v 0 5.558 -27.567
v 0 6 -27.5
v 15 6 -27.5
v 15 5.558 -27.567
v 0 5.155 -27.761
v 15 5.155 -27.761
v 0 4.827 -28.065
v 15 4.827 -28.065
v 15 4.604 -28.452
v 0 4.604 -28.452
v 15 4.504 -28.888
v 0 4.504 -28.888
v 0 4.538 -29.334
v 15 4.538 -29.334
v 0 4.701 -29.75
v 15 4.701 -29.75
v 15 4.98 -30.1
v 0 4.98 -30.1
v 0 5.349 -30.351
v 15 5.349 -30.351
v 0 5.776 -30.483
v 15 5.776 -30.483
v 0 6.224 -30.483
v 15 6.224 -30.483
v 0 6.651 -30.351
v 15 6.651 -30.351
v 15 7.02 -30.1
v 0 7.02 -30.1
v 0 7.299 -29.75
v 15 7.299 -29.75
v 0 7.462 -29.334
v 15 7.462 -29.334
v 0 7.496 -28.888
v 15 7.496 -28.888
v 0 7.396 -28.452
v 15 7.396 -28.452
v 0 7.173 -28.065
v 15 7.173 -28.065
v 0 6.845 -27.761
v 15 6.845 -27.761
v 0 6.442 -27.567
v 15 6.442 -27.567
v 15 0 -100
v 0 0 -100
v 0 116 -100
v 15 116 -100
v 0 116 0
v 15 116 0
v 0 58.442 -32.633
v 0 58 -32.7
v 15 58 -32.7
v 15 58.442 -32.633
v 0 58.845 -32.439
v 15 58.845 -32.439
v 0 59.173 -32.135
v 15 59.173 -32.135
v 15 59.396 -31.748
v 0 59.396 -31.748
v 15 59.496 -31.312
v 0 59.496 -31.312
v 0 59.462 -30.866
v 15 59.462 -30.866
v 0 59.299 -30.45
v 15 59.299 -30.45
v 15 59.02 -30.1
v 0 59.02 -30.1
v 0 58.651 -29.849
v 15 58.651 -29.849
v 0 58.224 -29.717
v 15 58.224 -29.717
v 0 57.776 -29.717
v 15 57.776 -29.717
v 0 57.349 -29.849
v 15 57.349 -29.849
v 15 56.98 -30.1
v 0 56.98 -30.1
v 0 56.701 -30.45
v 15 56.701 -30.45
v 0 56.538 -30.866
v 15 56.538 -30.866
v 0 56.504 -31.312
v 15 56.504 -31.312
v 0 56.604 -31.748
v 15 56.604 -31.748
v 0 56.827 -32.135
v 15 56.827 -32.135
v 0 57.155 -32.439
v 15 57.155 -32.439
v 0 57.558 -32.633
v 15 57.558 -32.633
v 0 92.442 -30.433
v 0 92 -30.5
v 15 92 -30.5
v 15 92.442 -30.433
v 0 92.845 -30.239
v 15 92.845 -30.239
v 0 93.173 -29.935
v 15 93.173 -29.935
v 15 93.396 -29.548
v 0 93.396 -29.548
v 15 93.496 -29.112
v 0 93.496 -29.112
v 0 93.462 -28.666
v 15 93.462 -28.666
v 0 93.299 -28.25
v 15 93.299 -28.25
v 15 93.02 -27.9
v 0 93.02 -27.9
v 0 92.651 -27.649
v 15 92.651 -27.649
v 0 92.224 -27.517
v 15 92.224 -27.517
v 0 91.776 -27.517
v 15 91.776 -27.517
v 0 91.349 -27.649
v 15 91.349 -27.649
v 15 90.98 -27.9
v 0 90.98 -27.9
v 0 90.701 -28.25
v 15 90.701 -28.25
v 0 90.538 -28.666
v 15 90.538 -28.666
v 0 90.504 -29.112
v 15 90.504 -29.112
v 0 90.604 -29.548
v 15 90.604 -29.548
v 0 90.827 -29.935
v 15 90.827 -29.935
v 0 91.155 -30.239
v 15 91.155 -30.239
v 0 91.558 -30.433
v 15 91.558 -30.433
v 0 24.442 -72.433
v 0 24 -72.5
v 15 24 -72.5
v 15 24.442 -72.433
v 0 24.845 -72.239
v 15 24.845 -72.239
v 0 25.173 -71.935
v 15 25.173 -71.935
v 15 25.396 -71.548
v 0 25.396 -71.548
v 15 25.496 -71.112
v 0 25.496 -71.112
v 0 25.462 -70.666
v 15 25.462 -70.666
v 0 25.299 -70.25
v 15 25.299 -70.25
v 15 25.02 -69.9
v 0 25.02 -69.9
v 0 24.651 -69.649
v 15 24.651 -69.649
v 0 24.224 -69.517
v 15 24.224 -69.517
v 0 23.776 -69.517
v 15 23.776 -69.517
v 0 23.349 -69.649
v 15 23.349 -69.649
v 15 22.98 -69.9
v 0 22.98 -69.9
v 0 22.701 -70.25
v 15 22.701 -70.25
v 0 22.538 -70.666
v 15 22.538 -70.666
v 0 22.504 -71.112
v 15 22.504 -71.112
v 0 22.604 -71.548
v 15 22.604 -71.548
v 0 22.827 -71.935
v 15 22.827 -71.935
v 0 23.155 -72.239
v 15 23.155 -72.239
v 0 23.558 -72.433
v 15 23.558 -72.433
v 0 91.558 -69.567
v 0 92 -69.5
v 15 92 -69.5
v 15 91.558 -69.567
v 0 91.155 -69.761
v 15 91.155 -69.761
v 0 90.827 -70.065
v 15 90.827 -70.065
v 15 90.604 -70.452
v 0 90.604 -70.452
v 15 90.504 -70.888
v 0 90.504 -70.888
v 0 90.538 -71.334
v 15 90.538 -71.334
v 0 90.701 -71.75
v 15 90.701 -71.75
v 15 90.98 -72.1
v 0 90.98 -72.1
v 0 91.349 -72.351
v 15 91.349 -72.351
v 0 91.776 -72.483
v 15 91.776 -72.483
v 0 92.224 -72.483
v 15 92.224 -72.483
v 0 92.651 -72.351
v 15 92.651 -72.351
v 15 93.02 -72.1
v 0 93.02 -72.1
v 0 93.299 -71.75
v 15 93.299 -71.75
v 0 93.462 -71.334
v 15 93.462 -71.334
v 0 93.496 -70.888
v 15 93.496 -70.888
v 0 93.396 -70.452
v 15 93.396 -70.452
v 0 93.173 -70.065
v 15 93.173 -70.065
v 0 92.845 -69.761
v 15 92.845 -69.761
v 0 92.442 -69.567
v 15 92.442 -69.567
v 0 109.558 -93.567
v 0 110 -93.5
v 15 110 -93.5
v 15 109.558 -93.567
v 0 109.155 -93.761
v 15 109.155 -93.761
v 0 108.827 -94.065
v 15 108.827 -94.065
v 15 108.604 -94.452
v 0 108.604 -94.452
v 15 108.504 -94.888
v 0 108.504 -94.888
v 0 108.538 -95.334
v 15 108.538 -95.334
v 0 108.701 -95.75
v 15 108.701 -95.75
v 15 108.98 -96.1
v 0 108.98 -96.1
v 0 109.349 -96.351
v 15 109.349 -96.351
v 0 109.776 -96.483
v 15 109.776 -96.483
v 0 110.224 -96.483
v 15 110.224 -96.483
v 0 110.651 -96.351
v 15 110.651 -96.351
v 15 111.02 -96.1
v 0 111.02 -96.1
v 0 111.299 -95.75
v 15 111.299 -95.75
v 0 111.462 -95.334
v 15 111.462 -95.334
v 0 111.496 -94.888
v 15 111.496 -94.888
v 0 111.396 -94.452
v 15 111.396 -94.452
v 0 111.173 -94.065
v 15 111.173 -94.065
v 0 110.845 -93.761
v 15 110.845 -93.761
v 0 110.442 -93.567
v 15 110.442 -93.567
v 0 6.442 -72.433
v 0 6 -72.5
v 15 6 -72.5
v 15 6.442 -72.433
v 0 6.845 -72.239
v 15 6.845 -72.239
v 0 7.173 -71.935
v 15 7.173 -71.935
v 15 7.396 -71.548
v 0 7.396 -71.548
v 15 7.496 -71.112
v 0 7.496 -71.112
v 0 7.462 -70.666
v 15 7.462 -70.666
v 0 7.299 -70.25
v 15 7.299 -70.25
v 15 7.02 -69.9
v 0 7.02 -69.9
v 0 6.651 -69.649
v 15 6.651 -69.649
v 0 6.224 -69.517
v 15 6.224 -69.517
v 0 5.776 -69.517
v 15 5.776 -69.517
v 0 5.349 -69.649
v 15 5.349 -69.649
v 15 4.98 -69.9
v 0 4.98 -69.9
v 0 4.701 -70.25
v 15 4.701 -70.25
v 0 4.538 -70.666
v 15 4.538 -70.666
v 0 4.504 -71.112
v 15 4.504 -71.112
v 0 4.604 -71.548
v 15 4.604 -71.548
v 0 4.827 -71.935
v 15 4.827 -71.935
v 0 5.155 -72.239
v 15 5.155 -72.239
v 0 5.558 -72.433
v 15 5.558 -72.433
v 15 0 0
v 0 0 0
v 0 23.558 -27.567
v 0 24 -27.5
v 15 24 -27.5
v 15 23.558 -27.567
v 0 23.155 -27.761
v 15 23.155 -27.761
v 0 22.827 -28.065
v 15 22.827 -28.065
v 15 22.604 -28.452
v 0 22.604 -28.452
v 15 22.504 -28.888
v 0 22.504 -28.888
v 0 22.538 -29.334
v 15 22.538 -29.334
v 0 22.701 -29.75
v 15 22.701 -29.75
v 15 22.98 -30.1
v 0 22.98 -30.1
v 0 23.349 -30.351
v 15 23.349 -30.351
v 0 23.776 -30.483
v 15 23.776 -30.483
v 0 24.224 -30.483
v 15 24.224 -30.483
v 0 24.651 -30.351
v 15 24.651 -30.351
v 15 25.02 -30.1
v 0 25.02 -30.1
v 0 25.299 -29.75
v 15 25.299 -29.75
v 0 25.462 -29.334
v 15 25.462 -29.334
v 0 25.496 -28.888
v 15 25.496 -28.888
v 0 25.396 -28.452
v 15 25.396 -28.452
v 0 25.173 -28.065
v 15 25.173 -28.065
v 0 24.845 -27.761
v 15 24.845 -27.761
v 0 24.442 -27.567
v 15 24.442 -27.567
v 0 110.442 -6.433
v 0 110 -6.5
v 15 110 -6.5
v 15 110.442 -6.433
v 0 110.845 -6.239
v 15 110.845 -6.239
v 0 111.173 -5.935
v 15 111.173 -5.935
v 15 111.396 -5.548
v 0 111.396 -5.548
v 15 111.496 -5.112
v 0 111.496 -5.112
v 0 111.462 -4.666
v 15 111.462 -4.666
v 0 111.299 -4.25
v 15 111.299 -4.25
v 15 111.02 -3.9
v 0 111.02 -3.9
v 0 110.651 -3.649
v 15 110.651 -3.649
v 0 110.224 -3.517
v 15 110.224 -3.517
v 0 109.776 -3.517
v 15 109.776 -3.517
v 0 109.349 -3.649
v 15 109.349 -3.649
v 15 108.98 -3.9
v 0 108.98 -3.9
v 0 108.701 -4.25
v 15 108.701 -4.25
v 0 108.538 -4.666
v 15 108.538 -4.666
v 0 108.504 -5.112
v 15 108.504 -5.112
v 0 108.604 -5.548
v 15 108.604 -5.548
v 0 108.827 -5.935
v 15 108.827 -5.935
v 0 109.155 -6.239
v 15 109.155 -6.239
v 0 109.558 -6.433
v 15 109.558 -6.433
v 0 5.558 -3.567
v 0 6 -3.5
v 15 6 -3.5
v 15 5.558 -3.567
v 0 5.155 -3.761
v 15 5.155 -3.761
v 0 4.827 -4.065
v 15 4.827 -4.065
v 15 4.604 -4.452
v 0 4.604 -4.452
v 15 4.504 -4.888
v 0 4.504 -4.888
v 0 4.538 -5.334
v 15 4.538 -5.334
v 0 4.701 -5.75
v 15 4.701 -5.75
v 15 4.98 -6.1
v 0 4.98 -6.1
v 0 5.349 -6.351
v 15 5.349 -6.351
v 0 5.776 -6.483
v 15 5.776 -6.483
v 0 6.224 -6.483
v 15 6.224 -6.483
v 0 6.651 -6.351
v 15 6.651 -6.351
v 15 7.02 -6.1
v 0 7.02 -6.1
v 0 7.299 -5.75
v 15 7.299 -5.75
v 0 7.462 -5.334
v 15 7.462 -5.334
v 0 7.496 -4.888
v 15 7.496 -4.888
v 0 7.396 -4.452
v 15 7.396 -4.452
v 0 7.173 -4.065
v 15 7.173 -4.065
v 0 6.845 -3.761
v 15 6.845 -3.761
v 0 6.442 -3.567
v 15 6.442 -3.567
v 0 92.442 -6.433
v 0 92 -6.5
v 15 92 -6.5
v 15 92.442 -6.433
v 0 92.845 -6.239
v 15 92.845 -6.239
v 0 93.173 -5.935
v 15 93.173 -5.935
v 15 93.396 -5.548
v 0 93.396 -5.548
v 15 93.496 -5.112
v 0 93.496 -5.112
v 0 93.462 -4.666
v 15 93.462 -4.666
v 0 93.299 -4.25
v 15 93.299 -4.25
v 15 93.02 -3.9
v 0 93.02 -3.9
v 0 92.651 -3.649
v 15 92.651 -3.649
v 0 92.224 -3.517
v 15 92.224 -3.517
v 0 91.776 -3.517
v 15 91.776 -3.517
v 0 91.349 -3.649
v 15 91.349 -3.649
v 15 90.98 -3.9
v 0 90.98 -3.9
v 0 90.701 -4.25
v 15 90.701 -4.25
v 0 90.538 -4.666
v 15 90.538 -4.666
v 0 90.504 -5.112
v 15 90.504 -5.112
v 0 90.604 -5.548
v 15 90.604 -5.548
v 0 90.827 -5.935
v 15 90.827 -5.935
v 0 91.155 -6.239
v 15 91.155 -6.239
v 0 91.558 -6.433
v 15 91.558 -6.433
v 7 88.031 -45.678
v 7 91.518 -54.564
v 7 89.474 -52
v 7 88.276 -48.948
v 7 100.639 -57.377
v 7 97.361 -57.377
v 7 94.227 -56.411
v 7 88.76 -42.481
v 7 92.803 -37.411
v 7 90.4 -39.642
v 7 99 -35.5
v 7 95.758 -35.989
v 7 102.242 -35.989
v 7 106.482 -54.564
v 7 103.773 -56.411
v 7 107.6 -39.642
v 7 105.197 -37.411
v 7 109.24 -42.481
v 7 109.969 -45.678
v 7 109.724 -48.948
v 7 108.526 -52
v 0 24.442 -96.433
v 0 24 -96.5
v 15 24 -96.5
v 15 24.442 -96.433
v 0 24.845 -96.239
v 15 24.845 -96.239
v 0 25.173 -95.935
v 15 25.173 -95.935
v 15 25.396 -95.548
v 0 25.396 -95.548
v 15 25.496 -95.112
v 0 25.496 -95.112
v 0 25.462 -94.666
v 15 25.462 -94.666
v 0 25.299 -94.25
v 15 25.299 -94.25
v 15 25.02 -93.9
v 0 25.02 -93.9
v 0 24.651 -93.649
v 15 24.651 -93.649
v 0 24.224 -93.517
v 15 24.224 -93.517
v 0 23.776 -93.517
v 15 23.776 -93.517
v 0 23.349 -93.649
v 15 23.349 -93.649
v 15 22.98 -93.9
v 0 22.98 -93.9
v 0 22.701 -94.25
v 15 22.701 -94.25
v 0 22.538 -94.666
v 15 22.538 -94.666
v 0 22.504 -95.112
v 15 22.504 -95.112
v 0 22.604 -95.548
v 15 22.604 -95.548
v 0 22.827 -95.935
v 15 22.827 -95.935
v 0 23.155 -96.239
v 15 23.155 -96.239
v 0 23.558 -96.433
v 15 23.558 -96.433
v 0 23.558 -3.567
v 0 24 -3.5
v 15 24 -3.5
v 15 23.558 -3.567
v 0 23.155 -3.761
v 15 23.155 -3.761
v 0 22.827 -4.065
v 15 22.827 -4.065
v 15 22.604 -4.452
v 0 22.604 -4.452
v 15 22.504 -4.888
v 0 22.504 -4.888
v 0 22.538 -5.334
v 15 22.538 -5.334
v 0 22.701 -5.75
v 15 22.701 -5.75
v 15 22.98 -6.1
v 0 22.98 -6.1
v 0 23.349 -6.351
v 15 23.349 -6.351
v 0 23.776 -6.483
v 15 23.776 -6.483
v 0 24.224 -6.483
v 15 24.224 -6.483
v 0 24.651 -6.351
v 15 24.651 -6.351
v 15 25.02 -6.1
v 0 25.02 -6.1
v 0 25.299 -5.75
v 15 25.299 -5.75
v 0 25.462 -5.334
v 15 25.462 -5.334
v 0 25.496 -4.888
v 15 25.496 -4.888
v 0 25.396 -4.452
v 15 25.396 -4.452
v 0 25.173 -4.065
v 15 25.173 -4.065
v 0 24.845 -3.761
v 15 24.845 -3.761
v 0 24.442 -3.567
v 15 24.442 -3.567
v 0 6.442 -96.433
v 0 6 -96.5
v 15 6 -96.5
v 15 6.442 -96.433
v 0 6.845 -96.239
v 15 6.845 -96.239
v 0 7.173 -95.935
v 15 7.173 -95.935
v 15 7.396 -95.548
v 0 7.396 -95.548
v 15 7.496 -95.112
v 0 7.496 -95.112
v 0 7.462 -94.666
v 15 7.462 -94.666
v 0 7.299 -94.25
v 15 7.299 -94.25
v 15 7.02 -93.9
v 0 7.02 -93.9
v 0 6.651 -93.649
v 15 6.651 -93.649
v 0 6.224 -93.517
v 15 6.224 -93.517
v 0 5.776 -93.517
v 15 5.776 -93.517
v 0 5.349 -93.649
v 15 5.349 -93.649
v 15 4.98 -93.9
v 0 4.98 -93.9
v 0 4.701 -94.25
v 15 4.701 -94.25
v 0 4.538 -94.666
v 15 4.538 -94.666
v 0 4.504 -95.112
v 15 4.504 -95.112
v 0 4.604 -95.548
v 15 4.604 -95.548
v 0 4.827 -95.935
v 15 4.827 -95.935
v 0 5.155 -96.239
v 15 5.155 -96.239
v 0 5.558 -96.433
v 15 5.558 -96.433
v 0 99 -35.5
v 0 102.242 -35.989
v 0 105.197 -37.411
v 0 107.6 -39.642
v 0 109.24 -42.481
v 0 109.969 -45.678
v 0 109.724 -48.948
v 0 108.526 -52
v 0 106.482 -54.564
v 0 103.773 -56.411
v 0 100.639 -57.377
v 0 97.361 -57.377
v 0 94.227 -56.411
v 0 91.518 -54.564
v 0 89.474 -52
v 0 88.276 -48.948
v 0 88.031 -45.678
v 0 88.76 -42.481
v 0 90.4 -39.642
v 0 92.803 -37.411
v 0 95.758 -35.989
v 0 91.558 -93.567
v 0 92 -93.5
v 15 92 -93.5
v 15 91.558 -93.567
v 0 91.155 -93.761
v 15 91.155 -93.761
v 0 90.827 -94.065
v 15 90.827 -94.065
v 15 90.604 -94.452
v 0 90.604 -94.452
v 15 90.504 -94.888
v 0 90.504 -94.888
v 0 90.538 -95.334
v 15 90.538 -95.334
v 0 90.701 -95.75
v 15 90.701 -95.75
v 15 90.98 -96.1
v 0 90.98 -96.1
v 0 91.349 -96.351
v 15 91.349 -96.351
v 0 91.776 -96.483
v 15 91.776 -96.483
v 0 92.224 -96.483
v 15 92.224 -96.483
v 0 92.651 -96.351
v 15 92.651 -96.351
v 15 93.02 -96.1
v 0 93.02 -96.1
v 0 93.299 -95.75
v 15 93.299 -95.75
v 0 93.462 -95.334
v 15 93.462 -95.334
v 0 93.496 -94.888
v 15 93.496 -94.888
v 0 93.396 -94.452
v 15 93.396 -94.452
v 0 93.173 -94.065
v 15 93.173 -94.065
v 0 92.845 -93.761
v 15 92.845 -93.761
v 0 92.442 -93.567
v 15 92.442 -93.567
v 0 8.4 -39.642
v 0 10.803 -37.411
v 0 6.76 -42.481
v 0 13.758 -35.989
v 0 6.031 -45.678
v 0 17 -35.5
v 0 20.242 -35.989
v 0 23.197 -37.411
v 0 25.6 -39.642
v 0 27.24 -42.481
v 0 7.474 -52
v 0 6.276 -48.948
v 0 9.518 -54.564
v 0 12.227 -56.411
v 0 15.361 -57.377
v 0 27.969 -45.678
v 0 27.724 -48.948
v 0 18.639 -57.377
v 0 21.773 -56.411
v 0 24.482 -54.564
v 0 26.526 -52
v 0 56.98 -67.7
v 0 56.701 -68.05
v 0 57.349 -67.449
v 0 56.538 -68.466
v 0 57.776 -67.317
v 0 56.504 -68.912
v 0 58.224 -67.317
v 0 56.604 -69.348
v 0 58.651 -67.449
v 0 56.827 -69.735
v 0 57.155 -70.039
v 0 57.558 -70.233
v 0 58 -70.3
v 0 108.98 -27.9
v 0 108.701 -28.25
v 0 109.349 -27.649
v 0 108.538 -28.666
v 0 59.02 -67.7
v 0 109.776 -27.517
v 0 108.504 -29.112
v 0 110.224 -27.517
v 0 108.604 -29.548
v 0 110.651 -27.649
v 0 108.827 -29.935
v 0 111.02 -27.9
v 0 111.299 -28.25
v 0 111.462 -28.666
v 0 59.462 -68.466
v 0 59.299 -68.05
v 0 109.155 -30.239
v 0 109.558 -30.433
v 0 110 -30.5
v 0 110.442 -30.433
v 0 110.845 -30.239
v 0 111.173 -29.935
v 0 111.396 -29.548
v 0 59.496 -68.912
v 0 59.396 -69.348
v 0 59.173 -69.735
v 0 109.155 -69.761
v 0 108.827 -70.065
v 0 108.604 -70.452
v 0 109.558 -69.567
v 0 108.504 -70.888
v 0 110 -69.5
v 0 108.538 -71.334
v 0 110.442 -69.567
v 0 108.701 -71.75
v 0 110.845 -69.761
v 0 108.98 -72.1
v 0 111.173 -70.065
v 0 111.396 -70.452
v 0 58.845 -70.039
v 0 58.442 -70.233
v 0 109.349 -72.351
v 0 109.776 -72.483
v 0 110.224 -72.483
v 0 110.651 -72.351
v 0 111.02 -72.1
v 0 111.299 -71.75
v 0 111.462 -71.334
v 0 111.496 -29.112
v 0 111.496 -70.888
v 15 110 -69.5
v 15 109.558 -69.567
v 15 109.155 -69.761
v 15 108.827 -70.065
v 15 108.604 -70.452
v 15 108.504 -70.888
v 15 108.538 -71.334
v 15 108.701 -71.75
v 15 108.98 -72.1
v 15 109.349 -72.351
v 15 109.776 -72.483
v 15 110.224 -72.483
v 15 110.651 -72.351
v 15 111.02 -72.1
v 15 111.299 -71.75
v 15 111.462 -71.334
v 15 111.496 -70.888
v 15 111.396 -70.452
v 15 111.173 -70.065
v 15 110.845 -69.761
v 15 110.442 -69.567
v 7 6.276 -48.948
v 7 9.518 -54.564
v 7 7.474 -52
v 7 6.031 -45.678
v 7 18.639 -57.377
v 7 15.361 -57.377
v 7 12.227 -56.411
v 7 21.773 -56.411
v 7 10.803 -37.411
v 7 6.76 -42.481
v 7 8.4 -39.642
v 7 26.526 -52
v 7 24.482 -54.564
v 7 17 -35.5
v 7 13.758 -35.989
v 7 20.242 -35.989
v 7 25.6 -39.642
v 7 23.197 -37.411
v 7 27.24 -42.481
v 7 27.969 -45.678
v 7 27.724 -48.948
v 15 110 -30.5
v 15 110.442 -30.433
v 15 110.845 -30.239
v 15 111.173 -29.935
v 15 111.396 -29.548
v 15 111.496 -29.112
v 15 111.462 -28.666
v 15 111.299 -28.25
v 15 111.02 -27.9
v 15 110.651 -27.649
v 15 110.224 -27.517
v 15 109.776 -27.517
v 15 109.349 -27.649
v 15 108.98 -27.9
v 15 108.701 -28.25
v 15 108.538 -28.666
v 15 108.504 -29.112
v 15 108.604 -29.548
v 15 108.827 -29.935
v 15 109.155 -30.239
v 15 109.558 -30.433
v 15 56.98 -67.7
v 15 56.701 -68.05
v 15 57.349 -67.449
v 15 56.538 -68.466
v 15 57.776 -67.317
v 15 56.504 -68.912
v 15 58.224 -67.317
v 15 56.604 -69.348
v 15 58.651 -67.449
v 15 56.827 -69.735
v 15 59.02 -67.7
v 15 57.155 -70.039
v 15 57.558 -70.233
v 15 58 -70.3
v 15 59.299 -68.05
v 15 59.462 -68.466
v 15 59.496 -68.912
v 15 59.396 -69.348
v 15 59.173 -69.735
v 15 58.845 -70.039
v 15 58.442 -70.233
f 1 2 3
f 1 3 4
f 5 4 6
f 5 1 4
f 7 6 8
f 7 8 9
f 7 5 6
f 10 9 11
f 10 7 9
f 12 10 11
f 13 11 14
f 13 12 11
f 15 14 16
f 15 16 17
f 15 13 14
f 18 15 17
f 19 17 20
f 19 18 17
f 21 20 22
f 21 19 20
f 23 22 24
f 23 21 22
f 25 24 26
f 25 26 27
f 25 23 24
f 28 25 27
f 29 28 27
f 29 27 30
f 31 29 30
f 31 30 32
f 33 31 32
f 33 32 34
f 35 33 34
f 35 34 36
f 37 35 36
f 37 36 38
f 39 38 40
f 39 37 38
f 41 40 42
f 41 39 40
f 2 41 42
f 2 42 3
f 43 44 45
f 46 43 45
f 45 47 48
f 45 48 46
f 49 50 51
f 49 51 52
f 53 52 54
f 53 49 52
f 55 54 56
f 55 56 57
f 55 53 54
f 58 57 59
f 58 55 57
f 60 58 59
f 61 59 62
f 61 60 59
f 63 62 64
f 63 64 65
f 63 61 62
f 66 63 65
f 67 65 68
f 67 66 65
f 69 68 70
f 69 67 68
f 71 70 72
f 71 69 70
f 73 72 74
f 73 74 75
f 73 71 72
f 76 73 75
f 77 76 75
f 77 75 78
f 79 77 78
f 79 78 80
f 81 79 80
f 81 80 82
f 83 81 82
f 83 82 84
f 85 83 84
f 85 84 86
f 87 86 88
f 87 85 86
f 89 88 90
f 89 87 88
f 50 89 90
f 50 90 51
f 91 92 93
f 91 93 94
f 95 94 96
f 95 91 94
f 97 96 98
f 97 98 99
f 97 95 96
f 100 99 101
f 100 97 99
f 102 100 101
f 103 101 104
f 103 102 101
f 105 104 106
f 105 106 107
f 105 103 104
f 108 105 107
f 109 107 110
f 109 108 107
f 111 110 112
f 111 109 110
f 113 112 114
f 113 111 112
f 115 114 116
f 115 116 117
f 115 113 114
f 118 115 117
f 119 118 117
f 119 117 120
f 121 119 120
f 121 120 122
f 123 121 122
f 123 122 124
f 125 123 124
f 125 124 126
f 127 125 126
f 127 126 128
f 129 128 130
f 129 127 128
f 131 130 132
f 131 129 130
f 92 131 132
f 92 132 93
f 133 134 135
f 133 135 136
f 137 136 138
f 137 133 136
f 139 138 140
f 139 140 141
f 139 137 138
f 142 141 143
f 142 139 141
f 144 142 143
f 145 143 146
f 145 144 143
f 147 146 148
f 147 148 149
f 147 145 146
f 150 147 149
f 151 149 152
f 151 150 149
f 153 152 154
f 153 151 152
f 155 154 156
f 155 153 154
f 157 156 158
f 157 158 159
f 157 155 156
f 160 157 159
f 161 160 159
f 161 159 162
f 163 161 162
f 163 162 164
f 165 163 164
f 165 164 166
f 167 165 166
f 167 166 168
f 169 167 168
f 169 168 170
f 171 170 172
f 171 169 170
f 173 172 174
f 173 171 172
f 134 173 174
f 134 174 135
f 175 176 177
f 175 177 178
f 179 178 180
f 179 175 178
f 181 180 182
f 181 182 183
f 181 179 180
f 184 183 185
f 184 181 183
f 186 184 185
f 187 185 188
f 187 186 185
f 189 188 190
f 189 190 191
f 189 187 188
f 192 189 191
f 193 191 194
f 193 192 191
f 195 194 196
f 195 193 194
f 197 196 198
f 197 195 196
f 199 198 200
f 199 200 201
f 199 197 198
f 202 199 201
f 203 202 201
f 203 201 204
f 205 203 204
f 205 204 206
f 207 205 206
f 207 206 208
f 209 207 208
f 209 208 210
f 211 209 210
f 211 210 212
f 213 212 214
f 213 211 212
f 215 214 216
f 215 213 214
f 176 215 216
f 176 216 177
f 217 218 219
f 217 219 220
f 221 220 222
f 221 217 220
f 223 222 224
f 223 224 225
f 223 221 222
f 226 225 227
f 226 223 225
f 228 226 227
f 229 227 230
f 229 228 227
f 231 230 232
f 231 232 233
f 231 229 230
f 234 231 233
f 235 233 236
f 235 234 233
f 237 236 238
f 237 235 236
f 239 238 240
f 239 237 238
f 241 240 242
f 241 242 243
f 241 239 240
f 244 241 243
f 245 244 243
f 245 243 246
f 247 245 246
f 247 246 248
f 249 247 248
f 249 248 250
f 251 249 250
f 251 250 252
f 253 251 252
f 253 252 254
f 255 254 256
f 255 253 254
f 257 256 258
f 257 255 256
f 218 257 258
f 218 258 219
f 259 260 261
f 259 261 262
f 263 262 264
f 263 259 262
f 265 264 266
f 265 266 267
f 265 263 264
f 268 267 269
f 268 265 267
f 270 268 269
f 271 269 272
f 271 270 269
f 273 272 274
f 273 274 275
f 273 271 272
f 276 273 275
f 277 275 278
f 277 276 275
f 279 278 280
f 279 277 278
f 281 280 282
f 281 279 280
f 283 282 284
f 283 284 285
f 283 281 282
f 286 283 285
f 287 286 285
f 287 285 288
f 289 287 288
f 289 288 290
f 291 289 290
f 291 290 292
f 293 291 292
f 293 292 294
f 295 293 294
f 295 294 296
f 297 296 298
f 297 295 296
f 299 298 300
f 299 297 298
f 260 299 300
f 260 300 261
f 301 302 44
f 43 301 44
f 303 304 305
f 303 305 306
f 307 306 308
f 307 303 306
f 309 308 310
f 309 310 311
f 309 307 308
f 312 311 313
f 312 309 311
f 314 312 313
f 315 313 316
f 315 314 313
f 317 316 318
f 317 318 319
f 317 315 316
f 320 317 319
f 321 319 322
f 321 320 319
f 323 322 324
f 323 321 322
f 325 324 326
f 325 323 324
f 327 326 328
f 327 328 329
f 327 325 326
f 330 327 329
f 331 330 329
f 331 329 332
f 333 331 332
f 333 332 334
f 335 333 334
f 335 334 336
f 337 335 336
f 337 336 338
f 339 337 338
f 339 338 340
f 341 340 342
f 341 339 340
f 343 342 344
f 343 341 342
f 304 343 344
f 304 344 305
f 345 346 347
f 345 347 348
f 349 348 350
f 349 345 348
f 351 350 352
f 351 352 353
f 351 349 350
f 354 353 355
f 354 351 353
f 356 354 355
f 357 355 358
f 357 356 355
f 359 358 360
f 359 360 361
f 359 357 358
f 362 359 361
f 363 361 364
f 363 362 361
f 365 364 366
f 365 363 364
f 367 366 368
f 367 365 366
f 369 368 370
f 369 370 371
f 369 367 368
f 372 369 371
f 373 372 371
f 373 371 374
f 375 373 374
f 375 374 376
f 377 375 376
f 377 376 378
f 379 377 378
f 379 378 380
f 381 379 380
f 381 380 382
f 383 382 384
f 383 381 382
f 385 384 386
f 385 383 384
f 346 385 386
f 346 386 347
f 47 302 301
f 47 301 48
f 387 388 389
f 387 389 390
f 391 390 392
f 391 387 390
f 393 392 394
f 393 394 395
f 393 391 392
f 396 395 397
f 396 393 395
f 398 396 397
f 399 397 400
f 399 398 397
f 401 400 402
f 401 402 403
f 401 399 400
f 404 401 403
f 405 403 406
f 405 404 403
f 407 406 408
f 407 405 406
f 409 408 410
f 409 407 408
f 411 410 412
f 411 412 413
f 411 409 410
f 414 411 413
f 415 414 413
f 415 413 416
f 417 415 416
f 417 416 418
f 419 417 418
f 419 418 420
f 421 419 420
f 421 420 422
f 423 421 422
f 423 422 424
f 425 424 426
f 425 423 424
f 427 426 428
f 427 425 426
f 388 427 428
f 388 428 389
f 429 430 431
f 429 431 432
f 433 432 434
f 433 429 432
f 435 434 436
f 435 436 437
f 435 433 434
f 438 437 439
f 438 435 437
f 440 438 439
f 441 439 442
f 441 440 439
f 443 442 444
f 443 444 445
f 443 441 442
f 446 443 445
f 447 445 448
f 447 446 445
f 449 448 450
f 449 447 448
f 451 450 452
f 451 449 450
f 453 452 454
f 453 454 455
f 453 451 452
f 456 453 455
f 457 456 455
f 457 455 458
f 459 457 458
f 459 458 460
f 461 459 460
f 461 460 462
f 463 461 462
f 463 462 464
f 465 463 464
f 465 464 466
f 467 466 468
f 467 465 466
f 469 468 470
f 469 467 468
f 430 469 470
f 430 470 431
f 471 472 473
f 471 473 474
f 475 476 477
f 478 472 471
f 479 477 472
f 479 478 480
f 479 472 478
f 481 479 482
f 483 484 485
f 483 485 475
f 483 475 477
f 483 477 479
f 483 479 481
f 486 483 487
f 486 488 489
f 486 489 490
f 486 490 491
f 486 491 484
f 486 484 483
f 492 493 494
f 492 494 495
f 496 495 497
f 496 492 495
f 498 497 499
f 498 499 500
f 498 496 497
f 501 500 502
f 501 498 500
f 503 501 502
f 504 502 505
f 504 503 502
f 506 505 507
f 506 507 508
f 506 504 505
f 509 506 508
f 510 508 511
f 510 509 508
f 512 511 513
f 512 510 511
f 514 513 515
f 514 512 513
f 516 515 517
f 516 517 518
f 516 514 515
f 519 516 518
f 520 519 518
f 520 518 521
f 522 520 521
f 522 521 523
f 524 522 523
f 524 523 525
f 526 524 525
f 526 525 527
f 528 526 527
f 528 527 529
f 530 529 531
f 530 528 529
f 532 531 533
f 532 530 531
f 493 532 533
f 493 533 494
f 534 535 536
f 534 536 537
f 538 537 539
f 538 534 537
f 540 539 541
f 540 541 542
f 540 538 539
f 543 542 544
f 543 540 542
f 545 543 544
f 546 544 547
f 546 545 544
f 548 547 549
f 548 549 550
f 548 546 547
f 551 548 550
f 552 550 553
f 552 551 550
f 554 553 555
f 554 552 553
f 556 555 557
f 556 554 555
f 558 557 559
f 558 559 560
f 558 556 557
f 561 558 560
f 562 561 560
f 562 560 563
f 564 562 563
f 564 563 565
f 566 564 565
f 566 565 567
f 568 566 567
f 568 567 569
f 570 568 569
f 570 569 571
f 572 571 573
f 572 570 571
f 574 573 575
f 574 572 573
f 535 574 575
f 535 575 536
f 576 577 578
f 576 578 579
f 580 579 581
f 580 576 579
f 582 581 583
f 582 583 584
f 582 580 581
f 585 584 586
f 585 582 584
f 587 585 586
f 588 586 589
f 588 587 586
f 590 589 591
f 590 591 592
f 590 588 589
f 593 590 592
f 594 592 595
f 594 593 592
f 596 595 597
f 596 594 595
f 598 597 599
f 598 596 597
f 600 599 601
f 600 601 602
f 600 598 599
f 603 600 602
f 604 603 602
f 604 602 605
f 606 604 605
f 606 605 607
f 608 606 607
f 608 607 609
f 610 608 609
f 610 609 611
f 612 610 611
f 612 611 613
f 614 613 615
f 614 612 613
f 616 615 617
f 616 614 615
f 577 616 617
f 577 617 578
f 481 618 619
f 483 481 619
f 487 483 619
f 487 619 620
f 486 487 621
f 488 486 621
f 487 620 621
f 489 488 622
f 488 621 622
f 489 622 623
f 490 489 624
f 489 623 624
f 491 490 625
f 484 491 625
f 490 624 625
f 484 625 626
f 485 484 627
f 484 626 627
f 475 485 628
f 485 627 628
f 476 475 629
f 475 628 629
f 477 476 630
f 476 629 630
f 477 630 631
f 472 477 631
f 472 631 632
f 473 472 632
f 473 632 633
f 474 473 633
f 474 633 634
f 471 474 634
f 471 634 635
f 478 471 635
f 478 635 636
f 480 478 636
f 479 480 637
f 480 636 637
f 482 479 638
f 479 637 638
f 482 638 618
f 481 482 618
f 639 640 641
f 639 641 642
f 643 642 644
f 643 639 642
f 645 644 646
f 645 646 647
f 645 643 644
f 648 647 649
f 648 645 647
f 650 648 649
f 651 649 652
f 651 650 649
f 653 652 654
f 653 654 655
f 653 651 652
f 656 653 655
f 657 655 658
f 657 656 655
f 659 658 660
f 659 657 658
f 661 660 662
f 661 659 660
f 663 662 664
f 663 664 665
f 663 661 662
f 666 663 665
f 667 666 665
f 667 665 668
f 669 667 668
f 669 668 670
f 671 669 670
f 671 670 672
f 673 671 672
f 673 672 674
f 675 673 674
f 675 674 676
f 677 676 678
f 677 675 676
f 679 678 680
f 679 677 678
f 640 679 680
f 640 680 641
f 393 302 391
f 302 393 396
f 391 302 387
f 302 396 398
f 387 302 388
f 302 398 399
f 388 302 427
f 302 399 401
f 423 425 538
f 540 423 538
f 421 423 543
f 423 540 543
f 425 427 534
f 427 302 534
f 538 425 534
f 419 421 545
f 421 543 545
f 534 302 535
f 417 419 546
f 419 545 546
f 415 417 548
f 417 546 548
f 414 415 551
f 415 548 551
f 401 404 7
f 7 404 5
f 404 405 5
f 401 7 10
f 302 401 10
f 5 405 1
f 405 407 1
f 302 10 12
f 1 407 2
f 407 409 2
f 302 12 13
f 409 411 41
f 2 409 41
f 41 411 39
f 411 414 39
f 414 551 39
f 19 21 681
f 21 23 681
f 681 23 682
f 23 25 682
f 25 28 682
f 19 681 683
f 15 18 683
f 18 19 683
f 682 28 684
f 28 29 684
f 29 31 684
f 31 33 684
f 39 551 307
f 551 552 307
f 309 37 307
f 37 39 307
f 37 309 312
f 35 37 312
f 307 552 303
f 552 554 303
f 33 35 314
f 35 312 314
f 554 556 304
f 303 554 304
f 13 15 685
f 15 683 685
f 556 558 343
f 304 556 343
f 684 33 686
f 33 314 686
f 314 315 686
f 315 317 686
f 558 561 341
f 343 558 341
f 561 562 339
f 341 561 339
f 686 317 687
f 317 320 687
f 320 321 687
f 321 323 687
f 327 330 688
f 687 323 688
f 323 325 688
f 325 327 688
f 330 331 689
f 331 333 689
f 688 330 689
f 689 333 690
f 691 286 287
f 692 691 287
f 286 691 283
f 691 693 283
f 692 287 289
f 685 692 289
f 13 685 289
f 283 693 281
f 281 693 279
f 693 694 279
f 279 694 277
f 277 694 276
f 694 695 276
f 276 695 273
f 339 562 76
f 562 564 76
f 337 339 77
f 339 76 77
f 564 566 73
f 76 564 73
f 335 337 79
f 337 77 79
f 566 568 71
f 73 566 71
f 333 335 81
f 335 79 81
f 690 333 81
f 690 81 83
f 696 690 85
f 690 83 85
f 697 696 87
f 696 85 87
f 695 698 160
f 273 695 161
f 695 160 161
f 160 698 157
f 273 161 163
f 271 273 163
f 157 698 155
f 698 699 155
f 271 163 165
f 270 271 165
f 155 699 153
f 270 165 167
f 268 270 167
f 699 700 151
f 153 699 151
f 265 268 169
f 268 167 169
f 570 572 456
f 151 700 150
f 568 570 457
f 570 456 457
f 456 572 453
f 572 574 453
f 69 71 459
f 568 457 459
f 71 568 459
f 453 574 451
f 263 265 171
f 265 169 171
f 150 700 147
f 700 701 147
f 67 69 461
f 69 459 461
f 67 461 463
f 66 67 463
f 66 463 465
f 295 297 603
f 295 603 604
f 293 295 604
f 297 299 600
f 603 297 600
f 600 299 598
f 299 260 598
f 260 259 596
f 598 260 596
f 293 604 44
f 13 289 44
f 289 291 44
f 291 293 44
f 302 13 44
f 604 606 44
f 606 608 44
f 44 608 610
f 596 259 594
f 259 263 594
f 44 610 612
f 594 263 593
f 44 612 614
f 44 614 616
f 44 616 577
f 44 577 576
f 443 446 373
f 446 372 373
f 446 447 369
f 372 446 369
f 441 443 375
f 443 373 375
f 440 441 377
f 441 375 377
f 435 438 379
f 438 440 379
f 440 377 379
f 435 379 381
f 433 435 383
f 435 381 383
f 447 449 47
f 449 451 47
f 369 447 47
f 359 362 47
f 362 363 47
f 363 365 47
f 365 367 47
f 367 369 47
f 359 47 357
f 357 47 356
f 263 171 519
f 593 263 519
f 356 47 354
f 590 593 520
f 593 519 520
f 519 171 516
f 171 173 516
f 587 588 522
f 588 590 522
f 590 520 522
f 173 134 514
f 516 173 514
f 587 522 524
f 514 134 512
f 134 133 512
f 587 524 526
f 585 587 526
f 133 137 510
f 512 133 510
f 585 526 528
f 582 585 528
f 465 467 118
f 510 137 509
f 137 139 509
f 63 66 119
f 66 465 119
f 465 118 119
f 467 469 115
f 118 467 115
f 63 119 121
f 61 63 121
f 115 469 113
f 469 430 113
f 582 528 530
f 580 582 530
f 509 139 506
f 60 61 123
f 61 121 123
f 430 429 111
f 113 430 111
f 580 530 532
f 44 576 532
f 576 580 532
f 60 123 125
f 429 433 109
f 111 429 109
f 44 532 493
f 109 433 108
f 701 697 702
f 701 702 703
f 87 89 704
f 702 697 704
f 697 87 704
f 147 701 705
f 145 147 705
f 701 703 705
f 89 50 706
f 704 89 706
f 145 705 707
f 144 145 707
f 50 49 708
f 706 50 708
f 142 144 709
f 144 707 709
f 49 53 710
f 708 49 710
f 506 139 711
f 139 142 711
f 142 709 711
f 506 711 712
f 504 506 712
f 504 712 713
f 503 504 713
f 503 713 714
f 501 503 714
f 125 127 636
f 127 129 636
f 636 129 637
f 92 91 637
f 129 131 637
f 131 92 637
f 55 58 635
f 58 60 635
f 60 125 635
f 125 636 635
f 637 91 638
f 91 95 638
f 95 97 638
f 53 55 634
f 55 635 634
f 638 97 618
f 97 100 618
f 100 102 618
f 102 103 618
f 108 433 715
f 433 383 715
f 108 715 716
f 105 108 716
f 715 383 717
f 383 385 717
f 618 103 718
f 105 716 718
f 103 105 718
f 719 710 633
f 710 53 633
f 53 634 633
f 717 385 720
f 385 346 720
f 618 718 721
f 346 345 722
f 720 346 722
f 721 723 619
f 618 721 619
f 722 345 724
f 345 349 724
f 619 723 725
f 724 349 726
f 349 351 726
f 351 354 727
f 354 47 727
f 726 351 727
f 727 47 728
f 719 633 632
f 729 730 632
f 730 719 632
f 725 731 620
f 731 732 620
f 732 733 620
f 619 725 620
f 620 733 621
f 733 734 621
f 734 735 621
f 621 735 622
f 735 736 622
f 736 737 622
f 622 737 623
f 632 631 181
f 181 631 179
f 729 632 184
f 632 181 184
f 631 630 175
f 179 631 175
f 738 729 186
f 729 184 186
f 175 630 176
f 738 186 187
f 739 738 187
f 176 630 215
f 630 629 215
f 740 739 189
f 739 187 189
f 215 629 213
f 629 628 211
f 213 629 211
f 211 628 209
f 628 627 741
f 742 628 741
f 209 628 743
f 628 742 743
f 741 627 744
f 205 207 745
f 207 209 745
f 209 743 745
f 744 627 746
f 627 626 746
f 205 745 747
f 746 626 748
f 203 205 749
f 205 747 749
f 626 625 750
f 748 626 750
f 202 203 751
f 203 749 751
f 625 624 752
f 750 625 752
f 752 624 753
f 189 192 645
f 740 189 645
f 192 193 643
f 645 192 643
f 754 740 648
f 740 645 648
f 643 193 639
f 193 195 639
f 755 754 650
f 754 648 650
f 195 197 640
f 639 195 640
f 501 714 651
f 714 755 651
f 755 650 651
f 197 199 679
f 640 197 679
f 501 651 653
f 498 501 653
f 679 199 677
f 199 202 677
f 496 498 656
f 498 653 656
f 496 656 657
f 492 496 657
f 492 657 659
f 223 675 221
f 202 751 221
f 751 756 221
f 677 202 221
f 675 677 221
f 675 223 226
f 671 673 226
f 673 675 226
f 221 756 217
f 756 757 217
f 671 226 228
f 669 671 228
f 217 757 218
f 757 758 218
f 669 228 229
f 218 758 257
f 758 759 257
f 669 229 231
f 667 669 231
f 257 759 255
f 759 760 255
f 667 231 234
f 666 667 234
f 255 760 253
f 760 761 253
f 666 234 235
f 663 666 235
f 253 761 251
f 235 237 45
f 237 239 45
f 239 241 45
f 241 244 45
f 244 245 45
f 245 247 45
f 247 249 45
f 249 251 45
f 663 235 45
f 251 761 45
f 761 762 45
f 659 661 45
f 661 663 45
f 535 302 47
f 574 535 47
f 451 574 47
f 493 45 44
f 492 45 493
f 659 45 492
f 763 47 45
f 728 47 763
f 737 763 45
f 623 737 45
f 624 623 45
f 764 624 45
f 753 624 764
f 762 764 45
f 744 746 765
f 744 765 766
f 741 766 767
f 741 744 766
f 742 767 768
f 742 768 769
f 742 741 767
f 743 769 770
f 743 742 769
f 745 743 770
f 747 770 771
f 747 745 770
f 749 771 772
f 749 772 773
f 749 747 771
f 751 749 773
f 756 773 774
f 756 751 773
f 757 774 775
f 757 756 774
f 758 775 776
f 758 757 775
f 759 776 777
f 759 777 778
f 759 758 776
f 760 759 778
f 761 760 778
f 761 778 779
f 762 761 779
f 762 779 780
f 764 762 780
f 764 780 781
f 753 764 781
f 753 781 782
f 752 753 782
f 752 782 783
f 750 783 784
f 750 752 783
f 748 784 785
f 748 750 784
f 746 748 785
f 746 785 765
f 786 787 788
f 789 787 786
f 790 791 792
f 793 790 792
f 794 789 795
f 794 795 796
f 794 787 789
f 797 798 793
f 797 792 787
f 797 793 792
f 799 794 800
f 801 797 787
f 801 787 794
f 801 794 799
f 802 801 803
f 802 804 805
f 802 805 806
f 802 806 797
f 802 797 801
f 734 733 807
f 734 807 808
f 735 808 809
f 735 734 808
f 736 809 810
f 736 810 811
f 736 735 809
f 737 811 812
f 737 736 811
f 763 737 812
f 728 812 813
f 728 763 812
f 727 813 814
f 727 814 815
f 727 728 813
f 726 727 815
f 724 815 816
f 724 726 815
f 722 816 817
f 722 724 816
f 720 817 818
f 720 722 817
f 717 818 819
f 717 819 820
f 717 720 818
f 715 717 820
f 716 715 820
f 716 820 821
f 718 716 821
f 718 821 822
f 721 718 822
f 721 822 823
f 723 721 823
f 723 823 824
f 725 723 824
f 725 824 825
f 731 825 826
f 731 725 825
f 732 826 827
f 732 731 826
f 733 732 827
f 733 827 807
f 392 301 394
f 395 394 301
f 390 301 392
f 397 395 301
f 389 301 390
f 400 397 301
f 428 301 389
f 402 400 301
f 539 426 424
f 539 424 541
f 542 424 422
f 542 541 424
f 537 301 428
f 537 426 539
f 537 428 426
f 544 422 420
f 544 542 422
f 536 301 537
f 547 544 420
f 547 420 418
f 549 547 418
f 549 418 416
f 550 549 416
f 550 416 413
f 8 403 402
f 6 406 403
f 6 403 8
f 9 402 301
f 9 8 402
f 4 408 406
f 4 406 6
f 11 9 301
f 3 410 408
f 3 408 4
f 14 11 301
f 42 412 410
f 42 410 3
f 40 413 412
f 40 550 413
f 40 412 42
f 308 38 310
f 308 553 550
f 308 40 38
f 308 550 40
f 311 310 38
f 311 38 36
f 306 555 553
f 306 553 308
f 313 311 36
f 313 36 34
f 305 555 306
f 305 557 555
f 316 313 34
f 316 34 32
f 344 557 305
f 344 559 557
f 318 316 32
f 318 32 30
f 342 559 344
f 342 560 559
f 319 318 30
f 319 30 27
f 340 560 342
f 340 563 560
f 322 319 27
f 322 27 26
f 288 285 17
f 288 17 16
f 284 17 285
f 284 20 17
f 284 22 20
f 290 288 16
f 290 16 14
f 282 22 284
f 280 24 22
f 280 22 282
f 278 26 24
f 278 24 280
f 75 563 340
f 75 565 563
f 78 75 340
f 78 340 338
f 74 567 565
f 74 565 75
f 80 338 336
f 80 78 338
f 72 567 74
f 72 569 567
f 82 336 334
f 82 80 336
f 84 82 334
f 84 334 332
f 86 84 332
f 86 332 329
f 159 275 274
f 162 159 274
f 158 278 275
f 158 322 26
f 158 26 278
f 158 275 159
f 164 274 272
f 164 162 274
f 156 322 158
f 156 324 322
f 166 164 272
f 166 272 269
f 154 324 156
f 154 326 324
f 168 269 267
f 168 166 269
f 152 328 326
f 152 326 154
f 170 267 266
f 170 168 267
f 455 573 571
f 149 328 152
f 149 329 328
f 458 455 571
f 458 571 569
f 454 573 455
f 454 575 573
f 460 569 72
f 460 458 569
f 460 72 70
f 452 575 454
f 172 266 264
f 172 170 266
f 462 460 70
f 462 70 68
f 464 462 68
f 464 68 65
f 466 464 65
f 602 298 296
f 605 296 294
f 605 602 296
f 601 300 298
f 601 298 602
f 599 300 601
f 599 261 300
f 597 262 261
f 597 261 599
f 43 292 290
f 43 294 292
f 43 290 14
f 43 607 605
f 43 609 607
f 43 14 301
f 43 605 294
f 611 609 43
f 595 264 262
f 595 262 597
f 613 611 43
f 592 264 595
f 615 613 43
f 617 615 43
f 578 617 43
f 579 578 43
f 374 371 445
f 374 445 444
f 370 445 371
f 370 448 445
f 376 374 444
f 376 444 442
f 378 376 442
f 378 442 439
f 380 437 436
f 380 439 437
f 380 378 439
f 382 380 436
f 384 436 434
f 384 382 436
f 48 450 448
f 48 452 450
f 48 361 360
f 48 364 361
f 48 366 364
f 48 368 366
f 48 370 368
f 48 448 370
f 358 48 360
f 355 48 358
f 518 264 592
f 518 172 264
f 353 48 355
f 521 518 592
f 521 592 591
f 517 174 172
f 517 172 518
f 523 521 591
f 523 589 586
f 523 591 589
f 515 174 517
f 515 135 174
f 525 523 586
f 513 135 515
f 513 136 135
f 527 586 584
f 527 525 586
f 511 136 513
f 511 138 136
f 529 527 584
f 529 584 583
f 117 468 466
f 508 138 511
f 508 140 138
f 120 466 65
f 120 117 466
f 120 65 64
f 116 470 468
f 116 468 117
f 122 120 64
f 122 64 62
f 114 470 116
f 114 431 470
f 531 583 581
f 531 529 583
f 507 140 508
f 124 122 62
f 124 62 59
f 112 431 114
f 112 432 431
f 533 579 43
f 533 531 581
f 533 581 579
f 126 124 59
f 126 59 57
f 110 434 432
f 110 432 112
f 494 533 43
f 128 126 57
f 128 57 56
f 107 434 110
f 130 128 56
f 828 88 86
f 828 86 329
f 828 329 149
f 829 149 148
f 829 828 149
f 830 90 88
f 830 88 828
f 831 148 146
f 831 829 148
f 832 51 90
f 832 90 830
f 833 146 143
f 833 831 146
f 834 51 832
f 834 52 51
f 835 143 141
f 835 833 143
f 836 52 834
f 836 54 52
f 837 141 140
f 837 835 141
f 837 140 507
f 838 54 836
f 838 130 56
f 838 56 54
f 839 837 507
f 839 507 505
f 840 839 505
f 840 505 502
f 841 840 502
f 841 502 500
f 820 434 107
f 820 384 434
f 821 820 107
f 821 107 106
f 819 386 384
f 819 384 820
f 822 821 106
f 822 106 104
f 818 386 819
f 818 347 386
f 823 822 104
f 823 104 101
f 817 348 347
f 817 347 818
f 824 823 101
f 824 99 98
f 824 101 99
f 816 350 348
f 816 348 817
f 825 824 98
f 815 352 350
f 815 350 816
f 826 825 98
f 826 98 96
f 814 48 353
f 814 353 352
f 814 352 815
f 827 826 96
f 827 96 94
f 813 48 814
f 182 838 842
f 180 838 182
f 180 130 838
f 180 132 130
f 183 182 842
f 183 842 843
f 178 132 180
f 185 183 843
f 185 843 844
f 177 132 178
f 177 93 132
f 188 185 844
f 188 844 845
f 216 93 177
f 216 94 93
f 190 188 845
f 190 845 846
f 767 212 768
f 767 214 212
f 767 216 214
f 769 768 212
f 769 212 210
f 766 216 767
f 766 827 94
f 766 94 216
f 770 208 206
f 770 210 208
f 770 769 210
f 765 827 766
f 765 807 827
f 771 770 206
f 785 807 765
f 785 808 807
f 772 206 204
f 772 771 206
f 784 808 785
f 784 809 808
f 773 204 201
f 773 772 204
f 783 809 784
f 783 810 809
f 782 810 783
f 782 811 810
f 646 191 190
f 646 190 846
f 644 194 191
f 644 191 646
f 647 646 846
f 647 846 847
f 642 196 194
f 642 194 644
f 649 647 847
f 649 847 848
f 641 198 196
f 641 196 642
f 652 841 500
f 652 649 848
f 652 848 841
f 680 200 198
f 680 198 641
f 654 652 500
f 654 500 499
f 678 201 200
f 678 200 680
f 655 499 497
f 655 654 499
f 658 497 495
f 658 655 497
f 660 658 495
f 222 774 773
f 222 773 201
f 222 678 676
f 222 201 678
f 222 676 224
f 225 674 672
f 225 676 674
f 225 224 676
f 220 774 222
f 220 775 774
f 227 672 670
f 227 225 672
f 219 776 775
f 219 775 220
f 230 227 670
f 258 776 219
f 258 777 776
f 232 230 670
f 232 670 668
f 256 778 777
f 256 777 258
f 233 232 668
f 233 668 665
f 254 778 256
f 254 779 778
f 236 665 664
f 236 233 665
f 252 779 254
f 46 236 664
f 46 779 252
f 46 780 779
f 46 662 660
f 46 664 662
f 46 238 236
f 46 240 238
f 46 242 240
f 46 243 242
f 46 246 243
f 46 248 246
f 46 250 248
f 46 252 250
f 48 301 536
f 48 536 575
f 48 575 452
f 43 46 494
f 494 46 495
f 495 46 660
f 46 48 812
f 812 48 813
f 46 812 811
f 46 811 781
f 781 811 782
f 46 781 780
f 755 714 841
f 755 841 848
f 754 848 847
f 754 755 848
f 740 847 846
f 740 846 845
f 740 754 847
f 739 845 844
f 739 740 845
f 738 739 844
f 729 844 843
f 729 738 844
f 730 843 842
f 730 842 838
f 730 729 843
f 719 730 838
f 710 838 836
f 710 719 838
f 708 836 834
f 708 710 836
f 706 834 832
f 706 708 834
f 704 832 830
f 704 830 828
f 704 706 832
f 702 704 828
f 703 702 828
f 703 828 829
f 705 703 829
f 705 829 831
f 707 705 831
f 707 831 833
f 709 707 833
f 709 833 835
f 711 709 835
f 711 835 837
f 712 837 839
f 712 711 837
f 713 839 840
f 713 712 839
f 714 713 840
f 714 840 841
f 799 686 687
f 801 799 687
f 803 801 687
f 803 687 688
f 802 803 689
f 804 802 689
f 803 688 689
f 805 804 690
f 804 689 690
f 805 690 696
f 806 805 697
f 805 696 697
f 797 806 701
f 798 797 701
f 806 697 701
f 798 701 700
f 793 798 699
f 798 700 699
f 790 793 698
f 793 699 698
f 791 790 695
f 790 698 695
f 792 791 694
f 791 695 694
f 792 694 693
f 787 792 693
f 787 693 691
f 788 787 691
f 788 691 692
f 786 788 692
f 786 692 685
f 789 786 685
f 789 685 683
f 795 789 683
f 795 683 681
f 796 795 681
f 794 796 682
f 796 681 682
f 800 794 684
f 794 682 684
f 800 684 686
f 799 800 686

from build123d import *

# Parameters (mm, degrees)
CROQUIS1_W              = 100
CROQUIS1_H              = 116
CROQUIS1_R              = 1.5
SALIENTE_EXTRUIR1_DEPTH = 15
CROQUIS3_R              = 11
CORTAR_EXTRUIR2_DEPTH   = 7


with BuildPart() as part:
    # Croquis1 → Saliente-Extruir1 (new body)
    with BuildSketch(Plane(origin=(0, 0, 0), x_dir=(0, 0, -1), z_dir=(1, 0, 0))):
        with Locations((50, 58)):
            Rectangle(CROQUIS1_W, CROQUIS1_H)
        with Locations((5, 110)):
            Circle(CROQUIS1_R, mode=Mode.SUBTRACT)
        with Locations((29, 110)):
            Circle(CROQUIS1_R, mode=Mode.SUBTRACT)
        with Locations((5, 92)):
            Circle(CROQUIS1_R, mode=Mode.SUBTRACT)
        with Locations((29, 92)):
            Circle(CROQUIS1_R, mode=Mode.SUBTRACT)
        with Locations(Location((5, 24, 0), (0, 0, 180))):
            Circle(CROQUIS1_R, mode=Mode.SUBTRACT)
        with Locations(Location((29, 24, 0), (0, 0, 180))):
            Circle(CROQUIS1_R, mode=Mode.SUBTRACT)
        with Locations(Location((29, 6, 0), (0, 0, 180))):
            Circle(CROQUIS1_R, mode=Mode.SUBTRACT)
        with Locations(Location((5, 6, 0), (0, 0, 180))):
            Circle(CROQUIS1_R, mode=Mode.SUBTRACT)
        with Locations((31.2, 58)):
            Circle(CROQUIS1_R, mode=Mode.SUBTRACT)
        with Locations((68.8, 58)):
            Circle(CROQUIS1_R, mode=Mode.SUBTRACT)
        with Locations((71, 6)):
            Circle(CROQUIS1_R, mode=Mode.SUBTRACT)
        with Locations((95, 6)):
            Circle(CROQUIS1_R, mode=Mode.SUBTRACT)
        with Locations((95, 24)):
            Circle(CROQUIS1_R, mode=Mode.SUBTRACT)
        with Locations((71, 24)):
            Circle(CROQUIS1_R, mode=Mode.SUBTRACT)
        with Locations(Location((95, 92, 0), (0, 0, 180))):
            Circle(CROQUIS1_R, mode=Mode.SUBTRACT)
        with Locations(Location((71, 92, 0), (0, 0, 180))):
            Circle(CROQUIS1_R, mode=Mode.SUBTRACT)
        with Locations(Location((71, 110, 0), (0, 0, 180))):
            Circle(CROQUIS1_R, mode=Mode.SUBTRACT)
        with Locations(Location((95, 110, 0), (0, 0, 180))):
            Circle(CROQUIS1_R, mode=Mode.SUBTRACT)
    extrude(amount=SALIENTE_EXTRUIR1_DEPTH)

    # Croquis3 → Cortar-Extruir2 (cut)
    with BuildSketch(Plane.ZY):
        with Locations((-46.5, 99)):
            Circle(CROQUIS3_R)
        with Locations((-46.5, 17)):
            Circle(CROQUIS3_R)
    extrude(amount=-CORTAR_EXTRUIR2_DEPTH, mode=Mode.SUBTRACT)


solid = part.part
